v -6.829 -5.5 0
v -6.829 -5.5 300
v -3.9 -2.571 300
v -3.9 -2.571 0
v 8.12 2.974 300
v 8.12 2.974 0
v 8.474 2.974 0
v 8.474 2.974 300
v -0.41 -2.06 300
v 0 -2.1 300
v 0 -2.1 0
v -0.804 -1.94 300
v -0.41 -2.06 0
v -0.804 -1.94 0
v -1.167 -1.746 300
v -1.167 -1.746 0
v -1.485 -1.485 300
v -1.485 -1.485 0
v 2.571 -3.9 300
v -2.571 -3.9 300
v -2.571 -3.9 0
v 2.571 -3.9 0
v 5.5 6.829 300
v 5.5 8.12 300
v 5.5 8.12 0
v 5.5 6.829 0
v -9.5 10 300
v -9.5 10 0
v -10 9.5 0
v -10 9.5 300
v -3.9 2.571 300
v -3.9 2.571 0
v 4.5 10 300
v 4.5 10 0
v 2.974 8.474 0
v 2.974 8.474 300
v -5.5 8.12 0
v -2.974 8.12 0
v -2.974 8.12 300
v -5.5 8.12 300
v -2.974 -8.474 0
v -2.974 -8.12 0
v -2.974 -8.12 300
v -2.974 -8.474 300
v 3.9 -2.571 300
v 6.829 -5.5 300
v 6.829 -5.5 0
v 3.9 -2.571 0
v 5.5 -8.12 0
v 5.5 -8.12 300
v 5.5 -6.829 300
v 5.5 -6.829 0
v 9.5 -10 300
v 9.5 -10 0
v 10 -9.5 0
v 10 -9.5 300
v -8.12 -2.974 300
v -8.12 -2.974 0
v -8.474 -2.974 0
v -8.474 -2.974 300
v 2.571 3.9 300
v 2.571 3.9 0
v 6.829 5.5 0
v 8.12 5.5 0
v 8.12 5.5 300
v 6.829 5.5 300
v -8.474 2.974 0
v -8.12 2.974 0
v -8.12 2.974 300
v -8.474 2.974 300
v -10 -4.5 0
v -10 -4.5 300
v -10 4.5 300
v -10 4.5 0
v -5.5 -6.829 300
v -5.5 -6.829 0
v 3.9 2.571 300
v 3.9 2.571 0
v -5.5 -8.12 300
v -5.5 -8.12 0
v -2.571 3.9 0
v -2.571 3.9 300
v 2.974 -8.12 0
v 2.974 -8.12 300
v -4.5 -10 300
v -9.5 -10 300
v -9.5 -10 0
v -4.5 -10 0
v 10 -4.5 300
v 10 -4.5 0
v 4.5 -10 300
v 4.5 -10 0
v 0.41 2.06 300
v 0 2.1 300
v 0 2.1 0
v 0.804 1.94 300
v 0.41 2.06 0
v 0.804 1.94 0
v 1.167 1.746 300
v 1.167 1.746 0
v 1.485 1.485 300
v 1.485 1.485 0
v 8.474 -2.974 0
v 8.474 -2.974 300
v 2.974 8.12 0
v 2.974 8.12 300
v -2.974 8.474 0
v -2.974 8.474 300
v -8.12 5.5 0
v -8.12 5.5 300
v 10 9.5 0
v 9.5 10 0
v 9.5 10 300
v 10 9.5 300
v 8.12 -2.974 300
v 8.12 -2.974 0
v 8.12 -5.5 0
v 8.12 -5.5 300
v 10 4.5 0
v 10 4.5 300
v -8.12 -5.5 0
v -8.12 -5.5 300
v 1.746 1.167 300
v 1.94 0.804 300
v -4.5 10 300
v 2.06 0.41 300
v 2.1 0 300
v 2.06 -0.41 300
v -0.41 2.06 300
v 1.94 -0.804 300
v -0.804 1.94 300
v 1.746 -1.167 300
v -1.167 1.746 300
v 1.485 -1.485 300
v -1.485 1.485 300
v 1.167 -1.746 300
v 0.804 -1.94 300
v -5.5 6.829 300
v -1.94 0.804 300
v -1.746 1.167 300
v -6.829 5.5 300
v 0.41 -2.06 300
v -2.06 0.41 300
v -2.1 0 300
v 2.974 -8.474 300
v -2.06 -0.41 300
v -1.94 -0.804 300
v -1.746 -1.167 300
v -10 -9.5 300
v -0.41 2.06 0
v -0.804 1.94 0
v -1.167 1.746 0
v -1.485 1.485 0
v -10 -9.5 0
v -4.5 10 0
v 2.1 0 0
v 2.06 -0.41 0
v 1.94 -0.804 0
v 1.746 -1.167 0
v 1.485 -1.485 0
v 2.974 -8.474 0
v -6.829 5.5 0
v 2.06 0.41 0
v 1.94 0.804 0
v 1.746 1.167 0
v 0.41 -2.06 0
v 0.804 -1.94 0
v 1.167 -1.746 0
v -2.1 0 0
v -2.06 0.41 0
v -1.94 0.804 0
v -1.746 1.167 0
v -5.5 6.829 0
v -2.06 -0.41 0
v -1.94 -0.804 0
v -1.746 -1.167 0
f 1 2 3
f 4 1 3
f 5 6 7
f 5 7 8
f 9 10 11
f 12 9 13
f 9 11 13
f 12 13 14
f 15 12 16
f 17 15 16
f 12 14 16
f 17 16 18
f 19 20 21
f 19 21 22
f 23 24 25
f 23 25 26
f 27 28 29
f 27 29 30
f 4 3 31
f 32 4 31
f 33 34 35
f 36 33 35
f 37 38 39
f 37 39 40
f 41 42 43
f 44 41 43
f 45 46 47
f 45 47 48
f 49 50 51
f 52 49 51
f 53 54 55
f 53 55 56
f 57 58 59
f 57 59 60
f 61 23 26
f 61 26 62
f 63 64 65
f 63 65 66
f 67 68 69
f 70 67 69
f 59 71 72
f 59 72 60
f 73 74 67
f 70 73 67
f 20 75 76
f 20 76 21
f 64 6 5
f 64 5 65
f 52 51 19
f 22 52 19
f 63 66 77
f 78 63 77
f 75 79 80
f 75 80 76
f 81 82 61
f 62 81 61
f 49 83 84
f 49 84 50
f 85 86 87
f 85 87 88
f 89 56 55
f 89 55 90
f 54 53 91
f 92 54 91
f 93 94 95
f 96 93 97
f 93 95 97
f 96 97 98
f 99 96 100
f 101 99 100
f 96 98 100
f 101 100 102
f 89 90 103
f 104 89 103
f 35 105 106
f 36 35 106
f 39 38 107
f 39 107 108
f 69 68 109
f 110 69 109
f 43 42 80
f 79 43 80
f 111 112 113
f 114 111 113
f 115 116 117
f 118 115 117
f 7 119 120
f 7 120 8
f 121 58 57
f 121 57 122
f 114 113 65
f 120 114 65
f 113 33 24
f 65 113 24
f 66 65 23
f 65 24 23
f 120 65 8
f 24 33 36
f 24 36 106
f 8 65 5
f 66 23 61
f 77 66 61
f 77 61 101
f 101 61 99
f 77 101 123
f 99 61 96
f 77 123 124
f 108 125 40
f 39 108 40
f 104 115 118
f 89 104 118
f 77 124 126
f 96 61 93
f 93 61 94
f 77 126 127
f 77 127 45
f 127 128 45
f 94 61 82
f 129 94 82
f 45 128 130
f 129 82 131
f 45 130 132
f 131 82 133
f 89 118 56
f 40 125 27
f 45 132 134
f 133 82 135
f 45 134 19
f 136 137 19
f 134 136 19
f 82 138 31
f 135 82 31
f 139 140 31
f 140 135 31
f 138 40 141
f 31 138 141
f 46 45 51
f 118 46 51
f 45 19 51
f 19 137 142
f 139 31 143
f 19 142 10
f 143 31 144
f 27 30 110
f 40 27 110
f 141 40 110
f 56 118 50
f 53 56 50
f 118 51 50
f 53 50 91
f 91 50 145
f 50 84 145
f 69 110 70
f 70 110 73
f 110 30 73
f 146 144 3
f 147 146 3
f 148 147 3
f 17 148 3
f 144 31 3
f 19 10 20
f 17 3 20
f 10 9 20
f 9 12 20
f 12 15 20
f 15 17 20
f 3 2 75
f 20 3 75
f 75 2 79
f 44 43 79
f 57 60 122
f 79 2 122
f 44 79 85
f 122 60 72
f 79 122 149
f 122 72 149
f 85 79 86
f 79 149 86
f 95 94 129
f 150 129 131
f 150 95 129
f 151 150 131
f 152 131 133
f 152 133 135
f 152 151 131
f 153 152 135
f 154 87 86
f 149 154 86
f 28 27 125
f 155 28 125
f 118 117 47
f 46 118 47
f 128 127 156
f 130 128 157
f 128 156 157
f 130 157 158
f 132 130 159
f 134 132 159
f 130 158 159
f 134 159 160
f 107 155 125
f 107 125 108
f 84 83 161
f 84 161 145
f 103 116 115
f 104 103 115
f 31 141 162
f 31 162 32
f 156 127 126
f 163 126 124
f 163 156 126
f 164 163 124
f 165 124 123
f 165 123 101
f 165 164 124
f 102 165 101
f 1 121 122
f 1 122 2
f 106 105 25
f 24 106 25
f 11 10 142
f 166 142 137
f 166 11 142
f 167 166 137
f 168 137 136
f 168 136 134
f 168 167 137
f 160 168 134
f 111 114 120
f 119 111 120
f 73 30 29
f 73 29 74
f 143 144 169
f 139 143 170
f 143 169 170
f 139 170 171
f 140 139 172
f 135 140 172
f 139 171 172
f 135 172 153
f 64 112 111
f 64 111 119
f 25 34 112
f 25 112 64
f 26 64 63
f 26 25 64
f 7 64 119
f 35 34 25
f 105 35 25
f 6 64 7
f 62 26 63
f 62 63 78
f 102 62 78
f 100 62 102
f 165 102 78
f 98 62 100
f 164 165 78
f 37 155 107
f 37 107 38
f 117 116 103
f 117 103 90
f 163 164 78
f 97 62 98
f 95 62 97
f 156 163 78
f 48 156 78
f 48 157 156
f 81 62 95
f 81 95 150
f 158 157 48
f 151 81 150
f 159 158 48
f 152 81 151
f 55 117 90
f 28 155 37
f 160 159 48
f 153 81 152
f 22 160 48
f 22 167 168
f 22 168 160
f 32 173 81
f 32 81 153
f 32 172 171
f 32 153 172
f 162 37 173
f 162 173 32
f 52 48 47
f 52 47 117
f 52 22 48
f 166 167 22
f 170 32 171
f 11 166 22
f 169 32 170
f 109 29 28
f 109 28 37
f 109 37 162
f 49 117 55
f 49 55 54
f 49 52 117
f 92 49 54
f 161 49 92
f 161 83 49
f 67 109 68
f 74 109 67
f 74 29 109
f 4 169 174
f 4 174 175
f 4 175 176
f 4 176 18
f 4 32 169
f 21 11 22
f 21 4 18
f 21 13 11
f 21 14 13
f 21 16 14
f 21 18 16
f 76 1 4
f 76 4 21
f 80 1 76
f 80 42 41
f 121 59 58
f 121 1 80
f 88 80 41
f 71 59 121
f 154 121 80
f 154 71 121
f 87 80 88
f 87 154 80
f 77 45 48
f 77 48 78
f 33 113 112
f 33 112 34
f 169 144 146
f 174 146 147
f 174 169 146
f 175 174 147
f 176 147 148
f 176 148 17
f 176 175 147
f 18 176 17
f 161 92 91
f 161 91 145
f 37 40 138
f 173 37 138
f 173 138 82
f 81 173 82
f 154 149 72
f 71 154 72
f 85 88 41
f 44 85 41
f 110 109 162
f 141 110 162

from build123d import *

# Parameters (mm, degrees)
BOSS_EXTRUDE1_DEPTH = 300
CHAMFER2_SIZE2      = 0.353553391
CHAMFER2_SIZE       = 0.5
CHAMFER1_SIZE       = 0.5


with BuildPart() as part:
    # Sketch1 → Boss-Extrude1 (new body)
    with BuildSketch(Plane.XY):
        with BuildLine():
            Line((5.5, 6.829360749), (2.570639251, 3.9))
            Line((2.570639251, 3.9), (0, 3.9))
            Line((0, 3.9), (0, 2.1))
            ThreePointArc((0, 2.1), (0.803635208, 1.940147018), (1.48492424, 1.48492424))
            Line((1.48492424, 1.48492424), (10, 10))
            Line((10, 10), (4.5, 10))
            Line((4.5, 10), (2.62, 8.12))
            Line((2.62, 8.12), (5.5, 8.12))
            Line((5.5, 8.12), (5.5, 6.829360749))
        make_face()
    extrude(amount=BOSS_EXTRUDE1_DEPTH)

    # Chamfer2
    chamfer2_edges = [part.edges().sort_by_distance(p)[0] for p in [
        (2.62, 8.12, 150),
    ]]
    chamfer(chamfer2_edges, length=CHAMFER2_SIZE, length2=CHAMFER2_SIZE2)

    # Mirror1: part across plane


with BuildPart() as part_1:
    add(part.part)
    add(part.part.mirror(Plane(origin=(10, 10, 300), x_dir=(0, 0, 1), z_dir=(-0.707106781, 0.707106781, 0))))

    # Chamfer1
    chamfer1_edges = [part_1.edges().sort_by_distance(p)[0] for p in [
        (10, 10, 150),
    ]]
    chamfer(chamfer1_edges, length=CHAMFER1_SIZE)

    # Mirror4: part across plane


with BuildPart() as part_2:
    add(part_1.part)
    add(part_1.part.mirror(Plane(origin=(0, 3.9, 300), x_dir=(0, 0, 1), z_dir=(1, 0, 0))))

    # Mirror5: part across plane


with BuildPart() as part_3:
    add(part_2.part)
    add(part_2.part.mirror(Plane(origin=(-3.9, 0, 300), x_dir=(0, 0, 1), z_dir=(0, 1, 0))))


solid = part_3.part
